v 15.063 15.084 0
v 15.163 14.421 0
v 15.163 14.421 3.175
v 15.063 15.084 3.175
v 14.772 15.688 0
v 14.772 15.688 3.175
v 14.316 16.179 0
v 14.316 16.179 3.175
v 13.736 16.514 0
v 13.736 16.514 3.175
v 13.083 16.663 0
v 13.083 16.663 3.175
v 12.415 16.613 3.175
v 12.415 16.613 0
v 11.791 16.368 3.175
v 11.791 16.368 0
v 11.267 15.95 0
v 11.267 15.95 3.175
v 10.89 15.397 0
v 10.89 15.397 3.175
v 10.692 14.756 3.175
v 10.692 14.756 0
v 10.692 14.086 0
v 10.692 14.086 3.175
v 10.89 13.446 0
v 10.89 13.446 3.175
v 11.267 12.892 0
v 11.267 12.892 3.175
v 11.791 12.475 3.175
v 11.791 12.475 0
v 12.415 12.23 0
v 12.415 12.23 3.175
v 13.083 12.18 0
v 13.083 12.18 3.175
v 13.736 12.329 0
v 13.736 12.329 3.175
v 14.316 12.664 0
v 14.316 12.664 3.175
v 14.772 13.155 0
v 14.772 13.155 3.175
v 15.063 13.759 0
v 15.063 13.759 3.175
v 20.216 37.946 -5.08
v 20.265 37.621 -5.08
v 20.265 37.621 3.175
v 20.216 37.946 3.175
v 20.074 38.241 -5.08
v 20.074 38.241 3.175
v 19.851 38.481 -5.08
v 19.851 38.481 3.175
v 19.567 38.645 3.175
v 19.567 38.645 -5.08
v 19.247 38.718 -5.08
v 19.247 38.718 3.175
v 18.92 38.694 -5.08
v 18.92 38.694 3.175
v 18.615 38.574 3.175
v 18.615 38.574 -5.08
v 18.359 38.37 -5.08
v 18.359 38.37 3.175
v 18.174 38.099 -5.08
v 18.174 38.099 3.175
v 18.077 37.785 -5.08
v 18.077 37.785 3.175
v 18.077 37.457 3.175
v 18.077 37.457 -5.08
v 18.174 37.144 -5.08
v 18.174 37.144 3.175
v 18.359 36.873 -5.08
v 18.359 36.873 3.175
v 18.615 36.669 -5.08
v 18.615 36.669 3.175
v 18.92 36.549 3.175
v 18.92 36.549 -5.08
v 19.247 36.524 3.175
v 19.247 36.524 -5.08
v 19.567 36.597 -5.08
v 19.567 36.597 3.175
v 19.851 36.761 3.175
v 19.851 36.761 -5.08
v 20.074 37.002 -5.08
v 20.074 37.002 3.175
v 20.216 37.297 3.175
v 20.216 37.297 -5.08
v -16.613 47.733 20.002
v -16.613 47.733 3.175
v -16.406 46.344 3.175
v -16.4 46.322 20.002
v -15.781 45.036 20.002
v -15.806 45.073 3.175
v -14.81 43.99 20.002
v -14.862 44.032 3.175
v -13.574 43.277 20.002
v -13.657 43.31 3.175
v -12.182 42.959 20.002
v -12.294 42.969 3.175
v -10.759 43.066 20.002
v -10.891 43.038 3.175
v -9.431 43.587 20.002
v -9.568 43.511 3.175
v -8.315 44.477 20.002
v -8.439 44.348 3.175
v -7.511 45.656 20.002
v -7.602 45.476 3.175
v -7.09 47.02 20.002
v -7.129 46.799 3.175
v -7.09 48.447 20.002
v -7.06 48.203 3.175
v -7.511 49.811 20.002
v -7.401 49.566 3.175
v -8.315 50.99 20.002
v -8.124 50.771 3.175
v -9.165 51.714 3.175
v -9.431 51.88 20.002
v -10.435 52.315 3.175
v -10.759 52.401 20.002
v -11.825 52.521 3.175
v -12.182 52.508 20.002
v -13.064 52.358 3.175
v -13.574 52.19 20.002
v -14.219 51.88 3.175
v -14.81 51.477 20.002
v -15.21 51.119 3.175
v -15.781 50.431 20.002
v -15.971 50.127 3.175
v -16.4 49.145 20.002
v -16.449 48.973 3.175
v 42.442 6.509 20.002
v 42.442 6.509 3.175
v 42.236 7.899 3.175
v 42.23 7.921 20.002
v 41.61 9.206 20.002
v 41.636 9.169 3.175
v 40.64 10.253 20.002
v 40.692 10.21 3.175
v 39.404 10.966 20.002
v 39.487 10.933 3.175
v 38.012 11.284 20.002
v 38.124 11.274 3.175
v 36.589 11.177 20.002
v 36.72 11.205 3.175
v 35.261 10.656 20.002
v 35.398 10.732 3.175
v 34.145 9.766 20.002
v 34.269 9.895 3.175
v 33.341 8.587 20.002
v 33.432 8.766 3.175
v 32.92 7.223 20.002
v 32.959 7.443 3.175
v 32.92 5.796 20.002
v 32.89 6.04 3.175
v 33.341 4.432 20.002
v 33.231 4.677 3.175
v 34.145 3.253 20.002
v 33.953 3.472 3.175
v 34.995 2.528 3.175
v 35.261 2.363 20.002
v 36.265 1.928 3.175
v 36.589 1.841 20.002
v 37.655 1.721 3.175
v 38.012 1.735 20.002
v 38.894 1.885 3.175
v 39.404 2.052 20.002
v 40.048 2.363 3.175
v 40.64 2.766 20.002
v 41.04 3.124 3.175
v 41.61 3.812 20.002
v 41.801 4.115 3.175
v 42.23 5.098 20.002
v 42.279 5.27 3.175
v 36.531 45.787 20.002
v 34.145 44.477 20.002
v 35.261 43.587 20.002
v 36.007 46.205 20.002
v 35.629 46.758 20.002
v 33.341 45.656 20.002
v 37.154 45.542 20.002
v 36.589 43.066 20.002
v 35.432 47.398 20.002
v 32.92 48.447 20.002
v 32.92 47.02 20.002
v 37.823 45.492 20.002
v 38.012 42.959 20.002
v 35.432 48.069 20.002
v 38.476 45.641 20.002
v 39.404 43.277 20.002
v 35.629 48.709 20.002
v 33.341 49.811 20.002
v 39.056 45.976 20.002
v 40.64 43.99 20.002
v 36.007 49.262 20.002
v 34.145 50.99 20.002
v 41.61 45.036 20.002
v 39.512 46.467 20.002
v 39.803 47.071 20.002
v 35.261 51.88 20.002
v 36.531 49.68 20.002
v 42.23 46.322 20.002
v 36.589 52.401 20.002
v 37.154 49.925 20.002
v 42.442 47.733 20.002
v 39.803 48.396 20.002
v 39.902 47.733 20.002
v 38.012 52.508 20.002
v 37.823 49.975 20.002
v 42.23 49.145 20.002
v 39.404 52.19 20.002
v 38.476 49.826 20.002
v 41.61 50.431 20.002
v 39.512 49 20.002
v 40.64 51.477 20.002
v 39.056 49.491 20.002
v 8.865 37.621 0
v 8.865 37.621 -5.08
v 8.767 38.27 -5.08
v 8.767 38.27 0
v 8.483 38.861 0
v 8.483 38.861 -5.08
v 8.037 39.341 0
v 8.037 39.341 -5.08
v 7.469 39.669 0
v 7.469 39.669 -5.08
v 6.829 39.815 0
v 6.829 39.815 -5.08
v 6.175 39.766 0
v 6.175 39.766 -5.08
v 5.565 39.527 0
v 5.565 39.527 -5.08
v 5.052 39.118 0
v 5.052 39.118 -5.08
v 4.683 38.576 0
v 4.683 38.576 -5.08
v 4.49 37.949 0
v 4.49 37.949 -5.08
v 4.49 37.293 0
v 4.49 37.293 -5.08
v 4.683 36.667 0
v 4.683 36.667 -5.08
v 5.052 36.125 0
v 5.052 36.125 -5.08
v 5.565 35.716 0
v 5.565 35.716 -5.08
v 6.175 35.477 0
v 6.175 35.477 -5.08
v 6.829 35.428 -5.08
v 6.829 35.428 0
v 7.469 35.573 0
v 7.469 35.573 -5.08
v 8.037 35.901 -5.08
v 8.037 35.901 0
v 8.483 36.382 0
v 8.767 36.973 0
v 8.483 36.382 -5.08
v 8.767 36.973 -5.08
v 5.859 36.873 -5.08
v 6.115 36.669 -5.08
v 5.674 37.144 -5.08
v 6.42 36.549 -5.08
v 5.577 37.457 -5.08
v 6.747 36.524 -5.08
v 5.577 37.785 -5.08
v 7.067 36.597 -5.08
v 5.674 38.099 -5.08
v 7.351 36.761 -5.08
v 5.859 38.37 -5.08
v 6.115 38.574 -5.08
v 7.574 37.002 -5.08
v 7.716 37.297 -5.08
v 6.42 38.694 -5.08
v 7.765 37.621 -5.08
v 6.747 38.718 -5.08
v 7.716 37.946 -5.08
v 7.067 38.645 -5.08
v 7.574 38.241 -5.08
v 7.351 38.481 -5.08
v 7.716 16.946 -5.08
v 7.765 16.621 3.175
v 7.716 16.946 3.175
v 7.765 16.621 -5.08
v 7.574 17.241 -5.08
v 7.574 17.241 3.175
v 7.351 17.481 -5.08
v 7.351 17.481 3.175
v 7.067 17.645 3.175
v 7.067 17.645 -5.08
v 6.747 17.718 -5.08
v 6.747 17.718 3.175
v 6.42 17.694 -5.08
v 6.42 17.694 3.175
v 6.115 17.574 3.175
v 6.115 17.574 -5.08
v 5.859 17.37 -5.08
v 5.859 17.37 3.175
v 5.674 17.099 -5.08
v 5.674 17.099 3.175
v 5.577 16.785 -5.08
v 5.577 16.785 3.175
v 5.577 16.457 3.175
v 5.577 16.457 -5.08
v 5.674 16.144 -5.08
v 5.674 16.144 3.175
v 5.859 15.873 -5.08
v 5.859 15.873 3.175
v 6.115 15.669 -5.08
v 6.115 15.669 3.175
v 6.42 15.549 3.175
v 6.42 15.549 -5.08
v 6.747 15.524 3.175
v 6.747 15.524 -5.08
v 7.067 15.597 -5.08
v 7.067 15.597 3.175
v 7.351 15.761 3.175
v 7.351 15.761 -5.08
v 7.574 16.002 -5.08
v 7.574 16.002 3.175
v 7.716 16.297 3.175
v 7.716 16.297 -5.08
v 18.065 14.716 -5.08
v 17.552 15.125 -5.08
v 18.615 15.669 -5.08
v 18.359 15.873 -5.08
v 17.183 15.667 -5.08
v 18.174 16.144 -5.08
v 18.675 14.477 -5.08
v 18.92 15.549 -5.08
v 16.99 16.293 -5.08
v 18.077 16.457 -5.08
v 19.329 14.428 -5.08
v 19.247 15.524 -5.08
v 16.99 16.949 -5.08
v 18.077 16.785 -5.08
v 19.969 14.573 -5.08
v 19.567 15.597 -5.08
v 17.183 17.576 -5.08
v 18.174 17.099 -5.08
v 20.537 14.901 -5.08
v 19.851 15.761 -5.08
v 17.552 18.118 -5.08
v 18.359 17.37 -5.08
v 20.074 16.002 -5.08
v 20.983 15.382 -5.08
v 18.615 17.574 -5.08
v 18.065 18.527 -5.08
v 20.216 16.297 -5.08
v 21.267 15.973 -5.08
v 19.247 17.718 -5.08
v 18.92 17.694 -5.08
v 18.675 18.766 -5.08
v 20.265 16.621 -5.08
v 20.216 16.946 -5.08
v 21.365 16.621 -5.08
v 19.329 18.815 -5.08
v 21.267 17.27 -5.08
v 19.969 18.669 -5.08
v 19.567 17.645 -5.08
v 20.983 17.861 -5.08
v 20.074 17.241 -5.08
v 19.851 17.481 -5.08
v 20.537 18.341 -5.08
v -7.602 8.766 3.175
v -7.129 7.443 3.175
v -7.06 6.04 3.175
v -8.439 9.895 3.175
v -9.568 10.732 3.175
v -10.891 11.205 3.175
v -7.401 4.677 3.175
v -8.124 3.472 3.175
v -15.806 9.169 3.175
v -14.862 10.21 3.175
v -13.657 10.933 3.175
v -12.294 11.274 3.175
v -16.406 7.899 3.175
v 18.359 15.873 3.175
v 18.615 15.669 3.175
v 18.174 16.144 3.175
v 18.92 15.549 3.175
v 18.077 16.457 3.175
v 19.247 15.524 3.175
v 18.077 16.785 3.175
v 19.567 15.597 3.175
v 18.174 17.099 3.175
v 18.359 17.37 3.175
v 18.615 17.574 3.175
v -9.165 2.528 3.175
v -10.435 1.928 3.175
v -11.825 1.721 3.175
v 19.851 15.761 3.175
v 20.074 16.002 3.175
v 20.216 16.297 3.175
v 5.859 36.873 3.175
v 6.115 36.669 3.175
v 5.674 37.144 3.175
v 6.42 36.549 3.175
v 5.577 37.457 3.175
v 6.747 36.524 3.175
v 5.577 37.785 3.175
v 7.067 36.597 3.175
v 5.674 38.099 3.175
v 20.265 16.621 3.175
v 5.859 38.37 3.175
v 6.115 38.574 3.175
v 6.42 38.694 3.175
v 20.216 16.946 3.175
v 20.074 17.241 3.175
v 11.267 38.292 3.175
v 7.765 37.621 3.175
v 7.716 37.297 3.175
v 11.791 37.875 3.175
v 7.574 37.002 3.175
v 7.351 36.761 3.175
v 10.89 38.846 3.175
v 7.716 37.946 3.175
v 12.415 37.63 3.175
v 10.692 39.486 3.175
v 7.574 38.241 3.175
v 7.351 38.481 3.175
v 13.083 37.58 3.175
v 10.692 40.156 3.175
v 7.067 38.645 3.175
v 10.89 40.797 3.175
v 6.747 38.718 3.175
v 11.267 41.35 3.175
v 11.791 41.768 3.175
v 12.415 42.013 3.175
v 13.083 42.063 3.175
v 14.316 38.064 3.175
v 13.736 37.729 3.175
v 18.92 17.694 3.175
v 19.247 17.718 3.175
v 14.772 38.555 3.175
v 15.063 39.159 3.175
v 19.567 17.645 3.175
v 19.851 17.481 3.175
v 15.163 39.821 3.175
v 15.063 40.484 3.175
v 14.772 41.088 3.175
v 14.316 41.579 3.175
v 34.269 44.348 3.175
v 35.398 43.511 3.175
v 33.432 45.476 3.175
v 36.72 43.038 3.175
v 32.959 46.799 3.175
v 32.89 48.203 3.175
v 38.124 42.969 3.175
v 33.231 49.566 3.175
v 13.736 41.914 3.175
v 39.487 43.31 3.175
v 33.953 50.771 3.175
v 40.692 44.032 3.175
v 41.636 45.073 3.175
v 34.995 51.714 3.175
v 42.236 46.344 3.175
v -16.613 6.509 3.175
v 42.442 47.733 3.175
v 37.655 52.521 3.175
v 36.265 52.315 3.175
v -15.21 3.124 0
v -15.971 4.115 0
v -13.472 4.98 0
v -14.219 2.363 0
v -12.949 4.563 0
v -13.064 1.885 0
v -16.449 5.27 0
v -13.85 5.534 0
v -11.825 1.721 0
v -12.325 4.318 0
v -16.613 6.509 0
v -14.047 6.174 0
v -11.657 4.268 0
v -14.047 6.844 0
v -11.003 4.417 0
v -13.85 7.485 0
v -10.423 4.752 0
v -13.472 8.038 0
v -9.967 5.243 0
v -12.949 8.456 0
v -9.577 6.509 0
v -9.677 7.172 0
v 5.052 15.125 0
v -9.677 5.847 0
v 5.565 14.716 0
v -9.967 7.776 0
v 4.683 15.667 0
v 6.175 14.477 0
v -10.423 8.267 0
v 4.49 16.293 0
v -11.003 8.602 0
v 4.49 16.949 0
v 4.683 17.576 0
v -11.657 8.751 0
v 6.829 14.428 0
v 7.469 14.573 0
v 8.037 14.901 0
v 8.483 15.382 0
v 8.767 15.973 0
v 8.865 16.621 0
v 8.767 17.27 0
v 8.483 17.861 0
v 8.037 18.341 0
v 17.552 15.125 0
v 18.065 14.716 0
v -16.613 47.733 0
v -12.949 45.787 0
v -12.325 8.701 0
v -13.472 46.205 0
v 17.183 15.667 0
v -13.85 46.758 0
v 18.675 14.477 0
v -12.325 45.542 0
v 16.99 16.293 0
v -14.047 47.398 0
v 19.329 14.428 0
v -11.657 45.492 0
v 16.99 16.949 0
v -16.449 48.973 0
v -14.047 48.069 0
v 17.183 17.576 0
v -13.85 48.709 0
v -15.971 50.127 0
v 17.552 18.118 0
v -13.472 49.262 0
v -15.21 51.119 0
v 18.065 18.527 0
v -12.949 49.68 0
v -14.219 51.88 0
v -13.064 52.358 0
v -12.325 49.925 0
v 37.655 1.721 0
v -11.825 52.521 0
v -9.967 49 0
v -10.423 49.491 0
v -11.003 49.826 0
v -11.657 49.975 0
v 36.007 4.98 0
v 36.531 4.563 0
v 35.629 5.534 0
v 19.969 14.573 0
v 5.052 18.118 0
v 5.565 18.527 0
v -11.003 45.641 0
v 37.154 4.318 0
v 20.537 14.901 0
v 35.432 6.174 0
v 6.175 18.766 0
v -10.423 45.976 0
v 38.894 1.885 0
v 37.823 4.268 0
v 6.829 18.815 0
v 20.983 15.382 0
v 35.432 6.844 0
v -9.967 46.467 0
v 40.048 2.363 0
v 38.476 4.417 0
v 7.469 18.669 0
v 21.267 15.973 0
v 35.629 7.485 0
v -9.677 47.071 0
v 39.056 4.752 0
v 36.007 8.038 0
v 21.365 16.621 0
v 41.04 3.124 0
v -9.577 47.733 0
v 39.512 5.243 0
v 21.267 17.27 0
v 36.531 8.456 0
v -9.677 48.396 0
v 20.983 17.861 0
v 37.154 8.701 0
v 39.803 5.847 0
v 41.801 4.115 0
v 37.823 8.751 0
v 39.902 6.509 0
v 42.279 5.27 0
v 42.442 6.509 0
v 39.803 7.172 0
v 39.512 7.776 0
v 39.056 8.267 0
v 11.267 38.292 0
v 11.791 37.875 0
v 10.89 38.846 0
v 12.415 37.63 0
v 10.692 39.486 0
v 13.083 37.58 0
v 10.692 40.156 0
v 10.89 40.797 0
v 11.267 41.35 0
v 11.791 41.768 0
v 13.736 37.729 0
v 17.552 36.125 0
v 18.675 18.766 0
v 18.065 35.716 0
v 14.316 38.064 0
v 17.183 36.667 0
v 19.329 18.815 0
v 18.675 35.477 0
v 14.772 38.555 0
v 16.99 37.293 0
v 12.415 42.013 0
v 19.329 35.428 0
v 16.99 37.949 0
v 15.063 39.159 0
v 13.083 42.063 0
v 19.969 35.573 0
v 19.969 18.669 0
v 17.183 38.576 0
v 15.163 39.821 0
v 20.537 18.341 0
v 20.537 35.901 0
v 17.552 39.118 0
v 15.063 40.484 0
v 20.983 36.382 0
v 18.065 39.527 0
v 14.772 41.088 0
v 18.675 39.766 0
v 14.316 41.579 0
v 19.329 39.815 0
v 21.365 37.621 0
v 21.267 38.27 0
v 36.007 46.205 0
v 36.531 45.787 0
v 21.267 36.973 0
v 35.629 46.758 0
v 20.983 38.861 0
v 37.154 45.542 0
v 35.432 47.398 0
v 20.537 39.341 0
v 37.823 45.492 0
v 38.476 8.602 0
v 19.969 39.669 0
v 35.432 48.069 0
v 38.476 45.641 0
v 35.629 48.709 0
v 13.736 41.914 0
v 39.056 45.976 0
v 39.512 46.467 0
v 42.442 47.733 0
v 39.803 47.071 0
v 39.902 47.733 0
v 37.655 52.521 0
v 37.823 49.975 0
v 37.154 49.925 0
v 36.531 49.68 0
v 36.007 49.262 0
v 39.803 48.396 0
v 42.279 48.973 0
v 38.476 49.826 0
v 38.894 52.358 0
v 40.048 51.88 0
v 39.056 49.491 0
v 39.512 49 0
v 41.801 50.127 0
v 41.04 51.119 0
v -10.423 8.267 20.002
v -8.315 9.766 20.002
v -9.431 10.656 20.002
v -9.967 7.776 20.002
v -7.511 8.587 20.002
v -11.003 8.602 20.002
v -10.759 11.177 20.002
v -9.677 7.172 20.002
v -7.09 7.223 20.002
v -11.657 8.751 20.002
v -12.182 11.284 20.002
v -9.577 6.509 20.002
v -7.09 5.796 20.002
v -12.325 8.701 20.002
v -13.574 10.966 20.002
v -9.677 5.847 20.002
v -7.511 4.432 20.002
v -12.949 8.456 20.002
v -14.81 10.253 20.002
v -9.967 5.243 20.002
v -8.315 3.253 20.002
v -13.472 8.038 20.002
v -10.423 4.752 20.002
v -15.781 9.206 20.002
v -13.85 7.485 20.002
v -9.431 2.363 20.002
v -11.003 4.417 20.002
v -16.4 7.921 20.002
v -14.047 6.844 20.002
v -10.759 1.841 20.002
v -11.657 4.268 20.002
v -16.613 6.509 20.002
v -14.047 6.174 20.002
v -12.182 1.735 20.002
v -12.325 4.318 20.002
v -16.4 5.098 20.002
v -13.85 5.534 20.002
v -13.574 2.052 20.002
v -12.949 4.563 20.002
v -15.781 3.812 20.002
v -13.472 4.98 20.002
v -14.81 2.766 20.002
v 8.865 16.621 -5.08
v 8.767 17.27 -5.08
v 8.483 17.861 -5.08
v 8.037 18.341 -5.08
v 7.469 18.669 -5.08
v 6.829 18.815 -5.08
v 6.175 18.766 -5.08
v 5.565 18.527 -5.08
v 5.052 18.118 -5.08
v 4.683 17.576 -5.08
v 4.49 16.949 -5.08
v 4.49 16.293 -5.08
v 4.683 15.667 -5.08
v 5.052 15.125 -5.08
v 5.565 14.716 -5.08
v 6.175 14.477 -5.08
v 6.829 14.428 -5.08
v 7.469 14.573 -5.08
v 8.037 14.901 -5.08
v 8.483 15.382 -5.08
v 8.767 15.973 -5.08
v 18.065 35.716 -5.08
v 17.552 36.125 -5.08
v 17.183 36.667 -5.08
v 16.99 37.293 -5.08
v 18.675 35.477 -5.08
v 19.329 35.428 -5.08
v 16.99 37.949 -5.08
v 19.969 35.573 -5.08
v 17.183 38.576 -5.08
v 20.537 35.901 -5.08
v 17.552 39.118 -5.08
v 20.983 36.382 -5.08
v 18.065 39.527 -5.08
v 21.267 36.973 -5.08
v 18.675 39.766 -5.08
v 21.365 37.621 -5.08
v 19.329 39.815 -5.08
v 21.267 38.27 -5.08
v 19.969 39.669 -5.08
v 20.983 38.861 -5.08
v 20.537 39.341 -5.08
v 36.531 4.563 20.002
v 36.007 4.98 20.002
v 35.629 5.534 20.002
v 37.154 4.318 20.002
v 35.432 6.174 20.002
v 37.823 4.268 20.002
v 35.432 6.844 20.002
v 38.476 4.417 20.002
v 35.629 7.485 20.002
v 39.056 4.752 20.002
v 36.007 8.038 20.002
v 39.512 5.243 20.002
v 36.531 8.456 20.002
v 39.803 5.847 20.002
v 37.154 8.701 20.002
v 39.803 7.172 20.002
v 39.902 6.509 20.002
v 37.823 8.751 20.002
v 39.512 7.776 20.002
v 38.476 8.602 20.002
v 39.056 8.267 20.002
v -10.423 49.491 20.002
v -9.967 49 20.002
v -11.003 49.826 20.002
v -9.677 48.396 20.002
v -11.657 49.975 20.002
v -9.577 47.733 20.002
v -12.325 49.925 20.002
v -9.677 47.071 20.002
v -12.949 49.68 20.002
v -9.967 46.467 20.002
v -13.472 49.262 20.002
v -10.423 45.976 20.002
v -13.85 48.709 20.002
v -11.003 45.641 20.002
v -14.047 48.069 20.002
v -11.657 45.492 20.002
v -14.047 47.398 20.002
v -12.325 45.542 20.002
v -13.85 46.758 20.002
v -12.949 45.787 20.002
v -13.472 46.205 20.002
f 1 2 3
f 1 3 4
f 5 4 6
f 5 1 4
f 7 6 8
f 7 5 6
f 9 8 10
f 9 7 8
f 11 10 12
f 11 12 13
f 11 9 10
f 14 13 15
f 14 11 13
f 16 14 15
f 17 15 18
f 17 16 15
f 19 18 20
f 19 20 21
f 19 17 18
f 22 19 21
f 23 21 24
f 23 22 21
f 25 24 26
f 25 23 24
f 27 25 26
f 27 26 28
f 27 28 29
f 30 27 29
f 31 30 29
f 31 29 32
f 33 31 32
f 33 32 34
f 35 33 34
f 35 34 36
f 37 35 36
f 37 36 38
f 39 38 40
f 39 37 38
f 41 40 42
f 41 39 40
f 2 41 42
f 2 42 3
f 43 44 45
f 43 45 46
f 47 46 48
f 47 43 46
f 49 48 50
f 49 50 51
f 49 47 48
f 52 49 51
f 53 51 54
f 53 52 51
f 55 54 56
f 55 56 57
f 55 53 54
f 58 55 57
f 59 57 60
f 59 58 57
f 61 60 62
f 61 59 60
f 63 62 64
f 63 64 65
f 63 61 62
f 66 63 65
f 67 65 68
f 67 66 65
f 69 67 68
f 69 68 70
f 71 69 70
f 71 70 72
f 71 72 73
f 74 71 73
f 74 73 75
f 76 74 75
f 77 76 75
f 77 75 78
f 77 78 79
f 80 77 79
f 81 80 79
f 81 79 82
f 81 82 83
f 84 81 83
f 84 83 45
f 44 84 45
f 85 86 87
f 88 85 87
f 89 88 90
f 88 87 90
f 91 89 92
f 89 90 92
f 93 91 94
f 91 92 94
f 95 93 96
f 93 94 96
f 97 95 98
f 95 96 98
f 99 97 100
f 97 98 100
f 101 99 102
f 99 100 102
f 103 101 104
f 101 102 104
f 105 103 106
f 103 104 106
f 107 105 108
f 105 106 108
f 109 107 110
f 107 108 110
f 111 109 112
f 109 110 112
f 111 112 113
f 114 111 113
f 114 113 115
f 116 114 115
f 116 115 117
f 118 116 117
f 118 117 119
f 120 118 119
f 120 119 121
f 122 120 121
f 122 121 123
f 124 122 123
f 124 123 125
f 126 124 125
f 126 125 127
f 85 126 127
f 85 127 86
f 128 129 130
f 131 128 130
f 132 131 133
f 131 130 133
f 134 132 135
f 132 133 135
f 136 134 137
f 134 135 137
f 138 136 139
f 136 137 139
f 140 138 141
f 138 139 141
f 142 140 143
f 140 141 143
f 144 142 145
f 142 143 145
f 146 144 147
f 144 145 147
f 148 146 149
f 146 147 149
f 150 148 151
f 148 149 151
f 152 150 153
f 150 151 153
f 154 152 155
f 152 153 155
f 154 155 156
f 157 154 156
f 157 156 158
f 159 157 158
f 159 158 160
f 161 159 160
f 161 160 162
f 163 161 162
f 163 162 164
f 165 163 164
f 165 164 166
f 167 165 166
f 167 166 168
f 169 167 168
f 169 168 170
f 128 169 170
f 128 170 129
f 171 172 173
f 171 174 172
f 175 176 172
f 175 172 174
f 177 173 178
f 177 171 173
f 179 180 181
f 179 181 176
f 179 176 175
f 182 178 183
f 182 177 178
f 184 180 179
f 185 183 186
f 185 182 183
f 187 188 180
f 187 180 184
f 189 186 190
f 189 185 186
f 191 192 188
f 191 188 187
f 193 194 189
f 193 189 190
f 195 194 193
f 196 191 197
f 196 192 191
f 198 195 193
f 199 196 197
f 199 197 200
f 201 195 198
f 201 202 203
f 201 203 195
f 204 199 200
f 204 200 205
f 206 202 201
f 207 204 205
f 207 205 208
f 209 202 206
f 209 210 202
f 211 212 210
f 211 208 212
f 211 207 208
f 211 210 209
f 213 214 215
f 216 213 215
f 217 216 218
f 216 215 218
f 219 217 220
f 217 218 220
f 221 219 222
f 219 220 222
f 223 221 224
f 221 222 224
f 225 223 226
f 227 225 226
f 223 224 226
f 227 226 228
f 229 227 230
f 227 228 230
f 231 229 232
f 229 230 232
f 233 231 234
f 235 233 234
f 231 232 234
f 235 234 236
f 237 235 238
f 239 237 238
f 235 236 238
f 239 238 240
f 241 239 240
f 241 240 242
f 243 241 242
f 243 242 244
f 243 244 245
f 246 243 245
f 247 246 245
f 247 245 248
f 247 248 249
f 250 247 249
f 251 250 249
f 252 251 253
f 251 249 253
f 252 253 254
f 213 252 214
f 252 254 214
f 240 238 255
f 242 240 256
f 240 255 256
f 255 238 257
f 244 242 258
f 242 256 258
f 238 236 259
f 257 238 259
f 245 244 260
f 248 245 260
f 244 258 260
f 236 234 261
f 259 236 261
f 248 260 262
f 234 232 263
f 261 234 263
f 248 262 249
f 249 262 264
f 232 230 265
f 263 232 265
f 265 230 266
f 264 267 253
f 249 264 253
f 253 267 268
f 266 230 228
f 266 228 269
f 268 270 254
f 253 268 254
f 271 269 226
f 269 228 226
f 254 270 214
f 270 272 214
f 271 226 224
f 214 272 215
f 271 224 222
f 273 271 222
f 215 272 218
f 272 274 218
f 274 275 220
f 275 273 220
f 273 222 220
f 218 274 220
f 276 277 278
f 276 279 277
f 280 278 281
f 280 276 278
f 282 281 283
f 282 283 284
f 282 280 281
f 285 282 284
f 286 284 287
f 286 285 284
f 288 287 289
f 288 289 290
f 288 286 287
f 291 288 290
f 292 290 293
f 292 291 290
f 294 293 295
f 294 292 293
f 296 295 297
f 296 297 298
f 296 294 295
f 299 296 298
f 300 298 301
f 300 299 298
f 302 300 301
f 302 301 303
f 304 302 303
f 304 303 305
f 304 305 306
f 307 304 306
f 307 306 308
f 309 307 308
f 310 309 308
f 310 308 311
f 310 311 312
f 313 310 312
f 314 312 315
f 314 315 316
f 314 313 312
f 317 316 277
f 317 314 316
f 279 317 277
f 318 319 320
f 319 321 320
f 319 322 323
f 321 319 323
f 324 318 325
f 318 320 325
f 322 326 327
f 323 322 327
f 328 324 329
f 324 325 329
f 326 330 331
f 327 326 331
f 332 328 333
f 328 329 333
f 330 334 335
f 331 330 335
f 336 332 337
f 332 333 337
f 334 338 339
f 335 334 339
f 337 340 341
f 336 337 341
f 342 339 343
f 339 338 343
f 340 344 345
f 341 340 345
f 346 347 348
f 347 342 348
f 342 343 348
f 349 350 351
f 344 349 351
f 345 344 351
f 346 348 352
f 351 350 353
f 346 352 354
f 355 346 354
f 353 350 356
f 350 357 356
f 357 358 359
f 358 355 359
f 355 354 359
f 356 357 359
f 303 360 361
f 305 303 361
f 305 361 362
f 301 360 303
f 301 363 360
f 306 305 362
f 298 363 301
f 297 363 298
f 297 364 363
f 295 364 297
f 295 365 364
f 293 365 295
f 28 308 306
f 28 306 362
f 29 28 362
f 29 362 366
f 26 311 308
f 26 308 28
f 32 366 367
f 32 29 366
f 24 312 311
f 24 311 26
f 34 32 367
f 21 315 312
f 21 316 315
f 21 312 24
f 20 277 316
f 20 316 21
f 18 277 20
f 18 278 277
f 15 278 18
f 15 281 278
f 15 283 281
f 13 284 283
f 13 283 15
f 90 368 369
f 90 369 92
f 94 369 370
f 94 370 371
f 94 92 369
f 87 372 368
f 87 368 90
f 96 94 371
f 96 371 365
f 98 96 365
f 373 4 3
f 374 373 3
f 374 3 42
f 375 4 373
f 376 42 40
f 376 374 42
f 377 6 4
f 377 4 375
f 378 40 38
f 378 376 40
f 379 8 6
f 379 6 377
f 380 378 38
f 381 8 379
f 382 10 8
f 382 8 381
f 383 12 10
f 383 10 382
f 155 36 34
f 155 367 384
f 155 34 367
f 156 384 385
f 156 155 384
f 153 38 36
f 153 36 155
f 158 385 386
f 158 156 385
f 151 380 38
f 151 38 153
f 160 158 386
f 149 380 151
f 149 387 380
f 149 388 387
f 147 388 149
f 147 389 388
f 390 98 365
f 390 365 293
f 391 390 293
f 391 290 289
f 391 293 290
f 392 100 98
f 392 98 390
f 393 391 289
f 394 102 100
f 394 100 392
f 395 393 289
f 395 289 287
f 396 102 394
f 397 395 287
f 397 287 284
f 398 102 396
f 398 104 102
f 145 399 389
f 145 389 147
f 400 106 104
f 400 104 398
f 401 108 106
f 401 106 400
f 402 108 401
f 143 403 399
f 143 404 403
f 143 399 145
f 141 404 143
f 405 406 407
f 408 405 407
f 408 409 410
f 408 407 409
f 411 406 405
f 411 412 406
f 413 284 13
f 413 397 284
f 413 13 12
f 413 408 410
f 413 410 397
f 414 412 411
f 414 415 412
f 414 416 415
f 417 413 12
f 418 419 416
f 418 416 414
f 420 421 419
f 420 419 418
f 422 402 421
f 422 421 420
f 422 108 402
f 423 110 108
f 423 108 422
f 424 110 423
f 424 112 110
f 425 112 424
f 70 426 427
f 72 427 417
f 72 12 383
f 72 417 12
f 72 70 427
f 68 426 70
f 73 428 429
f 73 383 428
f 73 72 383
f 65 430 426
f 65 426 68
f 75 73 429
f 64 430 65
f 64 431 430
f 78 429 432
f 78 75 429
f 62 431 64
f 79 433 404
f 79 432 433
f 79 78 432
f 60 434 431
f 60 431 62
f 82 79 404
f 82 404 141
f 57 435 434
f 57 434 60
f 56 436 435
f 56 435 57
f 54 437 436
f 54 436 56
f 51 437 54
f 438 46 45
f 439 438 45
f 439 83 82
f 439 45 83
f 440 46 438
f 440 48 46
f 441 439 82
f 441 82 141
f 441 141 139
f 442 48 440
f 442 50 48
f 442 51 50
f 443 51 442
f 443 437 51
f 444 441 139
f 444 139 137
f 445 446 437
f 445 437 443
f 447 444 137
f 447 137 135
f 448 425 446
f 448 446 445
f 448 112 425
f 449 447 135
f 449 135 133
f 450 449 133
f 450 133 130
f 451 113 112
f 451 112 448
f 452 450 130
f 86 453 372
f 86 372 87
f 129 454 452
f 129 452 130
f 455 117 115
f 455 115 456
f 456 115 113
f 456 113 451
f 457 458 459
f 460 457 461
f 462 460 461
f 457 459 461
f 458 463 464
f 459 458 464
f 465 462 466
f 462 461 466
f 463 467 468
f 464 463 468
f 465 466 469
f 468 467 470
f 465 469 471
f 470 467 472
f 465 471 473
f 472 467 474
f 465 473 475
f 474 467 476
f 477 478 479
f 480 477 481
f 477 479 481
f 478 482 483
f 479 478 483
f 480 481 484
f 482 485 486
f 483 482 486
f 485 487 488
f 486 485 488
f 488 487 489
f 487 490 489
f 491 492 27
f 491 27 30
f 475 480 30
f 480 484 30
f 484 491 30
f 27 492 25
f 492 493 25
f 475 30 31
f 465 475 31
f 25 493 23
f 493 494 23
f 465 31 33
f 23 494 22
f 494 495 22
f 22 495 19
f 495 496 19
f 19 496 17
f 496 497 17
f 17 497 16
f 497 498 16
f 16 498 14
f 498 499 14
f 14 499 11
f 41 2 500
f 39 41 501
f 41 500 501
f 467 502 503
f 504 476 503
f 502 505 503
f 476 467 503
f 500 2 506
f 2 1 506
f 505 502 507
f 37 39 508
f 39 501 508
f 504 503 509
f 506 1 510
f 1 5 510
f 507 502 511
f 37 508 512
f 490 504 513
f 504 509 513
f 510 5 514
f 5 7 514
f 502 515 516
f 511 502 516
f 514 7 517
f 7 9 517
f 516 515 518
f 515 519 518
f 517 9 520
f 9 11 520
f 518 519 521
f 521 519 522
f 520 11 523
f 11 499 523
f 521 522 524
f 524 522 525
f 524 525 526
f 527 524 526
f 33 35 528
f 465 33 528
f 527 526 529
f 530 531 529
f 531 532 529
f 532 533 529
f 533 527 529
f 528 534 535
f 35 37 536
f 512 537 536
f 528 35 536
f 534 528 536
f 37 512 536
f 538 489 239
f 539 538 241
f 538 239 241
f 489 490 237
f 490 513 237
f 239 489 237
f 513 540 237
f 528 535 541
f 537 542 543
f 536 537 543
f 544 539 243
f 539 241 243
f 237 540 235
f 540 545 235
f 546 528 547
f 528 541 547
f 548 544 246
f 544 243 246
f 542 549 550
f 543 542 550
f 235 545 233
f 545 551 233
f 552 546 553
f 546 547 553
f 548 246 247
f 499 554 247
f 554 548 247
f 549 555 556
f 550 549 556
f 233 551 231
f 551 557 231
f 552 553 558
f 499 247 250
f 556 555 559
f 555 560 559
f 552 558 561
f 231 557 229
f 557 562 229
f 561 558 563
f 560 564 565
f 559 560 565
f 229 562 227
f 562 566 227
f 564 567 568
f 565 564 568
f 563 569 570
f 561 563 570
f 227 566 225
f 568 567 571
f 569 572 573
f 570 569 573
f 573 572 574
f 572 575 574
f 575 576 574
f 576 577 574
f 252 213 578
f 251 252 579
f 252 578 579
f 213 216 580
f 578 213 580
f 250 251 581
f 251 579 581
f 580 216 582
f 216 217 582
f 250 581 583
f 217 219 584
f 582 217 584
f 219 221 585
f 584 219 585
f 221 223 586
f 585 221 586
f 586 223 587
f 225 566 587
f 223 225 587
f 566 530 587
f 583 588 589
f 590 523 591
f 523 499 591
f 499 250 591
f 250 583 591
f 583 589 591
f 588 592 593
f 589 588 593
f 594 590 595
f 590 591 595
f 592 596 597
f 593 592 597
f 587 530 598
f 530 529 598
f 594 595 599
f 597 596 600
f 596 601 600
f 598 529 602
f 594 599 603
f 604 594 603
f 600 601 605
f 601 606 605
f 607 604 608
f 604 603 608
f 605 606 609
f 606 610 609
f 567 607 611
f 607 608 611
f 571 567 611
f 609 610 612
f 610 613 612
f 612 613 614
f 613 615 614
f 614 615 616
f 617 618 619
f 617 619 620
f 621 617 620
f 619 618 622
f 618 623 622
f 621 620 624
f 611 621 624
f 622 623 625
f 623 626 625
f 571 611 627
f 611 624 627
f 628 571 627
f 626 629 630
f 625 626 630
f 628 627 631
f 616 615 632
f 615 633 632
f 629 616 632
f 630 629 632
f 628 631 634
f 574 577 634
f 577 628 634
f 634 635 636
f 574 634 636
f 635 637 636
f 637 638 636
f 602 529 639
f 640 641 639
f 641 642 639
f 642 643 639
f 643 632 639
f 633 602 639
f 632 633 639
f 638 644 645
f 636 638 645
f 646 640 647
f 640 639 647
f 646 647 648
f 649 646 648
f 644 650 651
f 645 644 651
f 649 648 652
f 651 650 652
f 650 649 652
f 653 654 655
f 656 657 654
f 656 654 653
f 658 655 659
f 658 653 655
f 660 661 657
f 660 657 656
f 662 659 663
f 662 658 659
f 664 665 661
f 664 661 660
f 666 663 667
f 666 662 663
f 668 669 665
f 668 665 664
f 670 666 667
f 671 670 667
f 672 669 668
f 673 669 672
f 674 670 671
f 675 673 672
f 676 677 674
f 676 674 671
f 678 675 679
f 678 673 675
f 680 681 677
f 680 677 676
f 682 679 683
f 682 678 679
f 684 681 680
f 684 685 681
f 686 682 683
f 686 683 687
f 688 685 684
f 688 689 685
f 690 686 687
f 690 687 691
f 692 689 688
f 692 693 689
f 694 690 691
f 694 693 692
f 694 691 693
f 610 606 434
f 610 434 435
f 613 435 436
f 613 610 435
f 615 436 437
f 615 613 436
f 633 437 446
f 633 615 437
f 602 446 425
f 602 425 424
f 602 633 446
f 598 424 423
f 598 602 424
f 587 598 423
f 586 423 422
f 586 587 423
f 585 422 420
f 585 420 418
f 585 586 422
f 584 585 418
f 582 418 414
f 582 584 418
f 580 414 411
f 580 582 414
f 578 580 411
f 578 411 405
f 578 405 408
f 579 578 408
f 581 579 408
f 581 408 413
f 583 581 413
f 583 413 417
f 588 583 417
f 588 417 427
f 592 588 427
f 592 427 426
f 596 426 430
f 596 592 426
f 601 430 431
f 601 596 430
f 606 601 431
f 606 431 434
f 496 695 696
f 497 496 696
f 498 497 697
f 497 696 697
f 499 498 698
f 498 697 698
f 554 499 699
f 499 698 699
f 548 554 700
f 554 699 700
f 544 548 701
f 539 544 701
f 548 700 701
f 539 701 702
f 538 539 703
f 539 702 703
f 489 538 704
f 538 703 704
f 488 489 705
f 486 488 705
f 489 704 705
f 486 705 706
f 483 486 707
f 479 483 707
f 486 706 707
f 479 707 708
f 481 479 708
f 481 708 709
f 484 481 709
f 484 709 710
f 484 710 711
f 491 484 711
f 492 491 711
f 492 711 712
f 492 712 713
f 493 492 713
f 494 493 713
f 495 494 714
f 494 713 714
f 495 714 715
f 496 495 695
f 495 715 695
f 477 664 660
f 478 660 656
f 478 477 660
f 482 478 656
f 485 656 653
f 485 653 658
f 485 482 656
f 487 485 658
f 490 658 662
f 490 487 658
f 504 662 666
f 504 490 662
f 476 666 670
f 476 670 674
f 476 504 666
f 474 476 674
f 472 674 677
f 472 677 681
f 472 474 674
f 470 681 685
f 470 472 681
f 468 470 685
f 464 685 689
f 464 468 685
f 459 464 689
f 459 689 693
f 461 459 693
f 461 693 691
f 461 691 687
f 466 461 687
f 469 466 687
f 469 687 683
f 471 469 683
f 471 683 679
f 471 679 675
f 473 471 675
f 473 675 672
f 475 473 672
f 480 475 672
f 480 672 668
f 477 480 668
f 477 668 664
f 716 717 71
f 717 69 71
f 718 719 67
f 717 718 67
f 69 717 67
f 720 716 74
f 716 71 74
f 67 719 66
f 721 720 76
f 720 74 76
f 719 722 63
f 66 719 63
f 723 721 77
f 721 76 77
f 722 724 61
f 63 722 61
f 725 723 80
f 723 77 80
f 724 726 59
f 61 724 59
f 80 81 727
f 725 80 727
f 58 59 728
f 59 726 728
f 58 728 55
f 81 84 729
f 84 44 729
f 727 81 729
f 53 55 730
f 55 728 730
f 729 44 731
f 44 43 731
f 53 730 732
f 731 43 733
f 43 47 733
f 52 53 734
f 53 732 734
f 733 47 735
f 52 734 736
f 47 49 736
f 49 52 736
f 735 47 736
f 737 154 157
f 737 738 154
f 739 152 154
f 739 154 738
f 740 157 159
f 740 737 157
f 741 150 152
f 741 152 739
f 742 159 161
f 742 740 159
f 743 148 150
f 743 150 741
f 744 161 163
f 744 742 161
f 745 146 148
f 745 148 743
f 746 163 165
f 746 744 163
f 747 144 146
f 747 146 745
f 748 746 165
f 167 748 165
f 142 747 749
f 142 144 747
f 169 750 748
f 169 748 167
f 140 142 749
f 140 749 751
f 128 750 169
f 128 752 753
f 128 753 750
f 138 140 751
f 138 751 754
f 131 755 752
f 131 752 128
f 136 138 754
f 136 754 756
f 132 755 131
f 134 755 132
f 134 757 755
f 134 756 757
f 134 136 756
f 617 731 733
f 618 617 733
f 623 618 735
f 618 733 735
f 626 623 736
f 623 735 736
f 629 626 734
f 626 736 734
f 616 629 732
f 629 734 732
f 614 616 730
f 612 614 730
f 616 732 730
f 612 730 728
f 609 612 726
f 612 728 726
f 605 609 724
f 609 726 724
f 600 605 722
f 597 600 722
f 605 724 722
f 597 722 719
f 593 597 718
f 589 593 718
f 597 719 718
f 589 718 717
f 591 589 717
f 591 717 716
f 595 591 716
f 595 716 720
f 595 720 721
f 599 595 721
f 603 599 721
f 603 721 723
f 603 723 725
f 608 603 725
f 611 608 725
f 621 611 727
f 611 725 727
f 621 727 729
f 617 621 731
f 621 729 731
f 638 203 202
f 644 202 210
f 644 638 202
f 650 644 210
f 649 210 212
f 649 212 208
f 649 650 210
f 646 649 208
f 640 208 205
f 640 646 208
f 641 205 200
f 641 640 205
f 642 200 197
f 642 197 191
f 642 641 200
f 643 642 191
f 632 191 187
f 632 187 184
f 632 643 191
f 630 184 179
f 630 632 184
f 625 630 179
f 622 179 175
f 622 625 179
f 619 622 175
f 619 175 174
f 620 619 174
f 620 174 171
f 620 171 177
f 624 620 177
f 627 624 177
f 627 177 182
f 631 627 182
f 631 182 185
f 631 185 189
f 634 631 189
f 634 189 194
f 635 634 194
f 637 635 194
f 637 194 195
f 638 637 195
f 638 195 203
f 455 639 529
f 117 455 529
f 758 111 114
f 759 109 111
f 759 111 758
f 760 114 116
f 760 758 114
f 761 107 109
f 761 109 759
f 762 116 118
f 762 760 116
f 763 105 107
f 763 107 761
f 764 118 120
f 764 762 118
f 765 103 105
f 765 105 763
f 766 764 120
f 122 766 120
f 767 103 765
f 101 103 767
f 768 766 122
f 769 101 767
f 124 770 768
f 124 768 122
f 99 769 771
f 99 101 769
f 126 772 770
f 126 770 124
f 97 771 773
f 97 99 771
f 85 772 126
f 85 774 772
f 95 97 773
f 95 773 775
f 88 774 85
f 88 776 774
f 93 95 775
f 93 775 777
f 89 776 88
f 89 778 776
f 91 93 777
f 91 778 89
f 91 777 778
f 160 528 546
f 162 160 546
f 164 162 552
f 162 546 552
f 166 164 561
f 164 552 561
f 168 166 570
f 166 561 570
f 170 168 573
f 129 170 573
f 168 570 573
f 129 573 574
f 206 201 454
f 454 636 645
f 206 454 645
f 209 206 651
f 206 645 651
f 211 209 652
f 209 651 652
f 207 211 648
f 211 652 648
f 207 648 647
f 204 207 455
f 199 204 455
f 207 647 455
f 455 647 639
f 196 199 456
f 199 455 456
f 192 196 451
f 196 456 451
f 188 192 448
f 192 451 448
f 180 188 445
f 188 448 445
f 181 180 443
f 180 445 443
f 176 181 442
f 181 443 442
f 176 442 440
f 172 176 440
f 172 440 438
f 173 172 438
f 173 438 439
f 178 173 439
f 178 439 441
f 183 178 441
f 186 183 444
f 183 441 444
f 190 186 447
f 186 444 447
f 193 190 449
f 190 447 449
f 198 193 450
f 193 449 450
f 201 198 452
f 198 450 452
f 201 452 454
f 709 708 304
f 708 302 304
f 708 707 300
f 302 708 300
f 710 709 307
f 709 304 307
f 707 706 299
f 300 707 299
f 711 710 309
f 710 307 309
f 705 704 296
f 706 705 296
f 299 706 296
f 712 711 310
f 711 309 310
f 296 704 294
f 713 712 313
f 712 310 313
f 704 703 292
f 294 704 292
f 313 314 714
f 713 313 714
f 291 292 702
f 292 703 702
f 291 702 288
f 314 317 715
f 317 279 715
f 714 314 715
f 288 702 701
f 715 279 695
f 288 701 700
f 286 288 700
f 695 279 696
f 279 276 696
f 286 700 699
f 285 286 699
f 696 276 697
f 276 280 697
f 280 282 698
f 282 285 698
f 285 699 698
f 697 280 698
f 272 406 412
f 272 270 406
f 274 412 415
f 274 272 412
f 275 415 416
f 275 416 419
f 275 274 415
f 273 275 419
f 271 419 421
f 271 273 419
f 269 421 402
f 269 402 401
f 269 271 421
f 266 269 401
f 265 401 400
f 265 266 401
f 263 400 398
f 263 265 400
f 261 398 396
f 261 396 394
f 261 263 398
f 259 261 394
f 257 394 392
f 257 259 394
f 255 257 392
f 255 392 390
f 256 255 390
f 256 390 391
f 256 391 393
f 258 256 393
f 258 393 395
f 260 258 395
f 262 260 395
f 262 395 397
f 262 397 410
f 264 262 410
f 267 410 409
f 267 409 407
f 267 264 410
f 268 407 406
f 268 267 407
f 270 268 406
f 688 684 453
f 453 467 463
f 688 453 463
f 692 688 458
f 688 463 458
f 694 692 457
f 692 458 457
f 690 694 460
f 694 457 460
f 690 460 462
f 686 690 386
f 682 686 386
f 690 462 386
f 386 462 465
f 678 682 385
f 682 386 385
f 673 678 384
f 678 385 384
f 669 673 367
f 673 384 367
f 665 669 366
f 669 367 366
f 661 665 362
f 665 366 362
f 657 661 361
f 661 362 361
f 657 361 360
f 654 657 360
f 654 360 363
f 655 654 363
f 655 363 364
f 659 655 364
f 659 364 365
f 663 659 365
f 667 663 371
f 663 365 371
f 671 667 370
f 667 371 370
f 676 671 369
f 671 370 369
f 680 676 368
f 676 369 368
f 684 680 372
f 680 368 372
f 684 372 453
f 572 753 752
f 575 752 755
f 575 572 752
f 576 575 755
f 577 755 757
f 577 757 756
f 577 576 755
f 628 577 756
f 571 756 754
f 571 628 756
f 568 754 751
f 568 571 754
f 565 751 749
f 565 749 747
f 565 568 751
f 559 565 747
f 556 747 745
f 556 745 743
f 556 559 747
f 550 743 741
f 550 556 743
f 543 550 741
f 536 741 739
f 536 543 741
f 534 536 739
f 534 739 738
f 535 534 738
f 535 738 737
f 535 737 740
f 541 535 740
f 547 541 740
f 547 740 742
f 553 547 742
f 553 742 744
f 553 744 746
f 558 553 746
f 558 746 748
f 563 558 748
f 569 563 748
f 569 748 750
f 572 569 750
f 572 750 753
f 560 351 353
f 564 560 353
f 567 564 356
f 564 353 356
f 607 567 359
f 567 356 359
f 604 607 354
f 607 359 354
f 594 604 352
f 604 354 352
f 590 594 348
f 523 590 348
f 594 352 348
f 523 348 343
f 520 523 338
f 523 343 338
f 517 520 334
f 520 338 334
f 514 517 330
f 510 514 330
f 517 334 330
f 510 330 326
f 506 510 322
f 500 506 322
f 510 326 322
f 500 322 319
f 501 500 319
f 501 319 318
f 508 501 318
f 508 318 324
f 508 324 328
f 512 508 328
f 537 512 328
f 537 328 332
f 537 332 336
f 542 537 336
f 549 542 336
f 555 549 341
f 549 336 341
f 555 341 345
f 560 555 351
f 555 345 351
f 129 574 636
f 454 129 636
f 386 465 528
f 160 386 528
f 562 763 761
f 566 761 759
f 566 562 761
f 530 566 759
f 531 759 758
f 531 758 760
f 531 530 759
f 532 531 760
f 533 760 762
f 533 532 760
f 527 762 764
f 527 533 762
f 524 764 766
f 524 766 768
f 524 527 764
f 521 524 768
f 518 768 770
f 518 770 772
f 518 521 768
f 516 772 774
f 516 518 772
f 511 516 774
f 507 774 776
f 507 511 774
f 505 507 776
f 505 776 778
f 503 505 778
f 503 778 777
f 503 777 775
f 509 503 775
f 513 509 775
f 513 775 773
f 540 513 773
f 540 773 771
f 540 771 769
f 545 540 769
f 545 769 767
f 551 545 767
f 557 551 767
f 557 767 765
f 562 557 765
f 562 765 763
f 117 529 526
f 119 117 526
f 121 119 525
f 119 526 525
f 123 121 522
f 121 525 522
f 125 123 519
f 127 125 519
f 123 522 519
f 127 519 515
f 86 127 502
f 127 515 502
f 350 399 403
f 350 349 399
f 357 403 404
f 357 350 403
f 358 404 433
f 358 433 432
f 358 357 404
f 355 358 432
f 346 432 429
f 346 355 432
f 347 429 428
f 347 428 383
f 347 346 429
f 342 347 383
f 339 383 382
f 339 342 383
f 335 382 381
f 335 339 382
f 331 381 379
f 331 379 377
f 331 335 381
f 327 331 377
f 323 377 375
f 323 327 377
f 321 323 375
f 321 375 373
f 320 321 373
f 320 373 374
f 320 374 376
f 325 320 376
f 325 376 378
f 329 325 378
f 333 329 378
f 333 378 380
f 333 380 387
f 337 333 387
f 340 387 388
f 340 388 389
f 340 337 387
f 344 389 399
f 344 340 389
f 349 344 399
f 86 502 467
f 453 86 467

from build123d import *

# Parameters (mm, degrees)
SKETCH1_R           = 2.2479
SKETCH1_R_2         = 1.1
BOSS_EXTRUDE1_DEPTH = 3.175
BOSS_EXTRUDE2_START = -5.08
SKETCH1_4_R         = 2.2
SKETCH1_4_R_2       = 1.1
BOSS_EXTRUDE2_DEPTH = 5.08
SKETCH1_5_R         = 4.7879
SKETCH1_5_R_2       = 2.2479
BOSS_EXTRUDE3_DEPTH = 20.0025


with BuildPart() as part:
    # Sketch1 → Boss-Extrude1 (new body)
    with BuildSketch(Plane.XY):
        with BuildLine():
            Line((-16.612553398, 47.733487864), (-16.612553398, 6.509287864))
            ThreePointArc((-16.612553398, 6.509287864), (-15.210209956, 3.123731306), (-11.824653398, 1.721387864))
            Line((-11.824653398, 1.721387864), (37.654546627, 1.721387864))
            ThreePointArc((37.654546627, 1.721387864), (41.040103169, 3.123731315), (42.442446602, 6.509287864))
            Line((42.442446602, 6.509287864), (42.442446602, 47.733487864))
            ThreePointArc((42.442446602, 47.733487864), (41.04010316, 51.119044422), (37.654546602, 52.521387864))
            Line((37.654546602, 52.521387864), (-11.824653398, 52.521387864))
            ThreePointArc((-11.824653398, 52.521387864), (-15.210209956, 51.119044422), (-16.612553398, 47.733487864))
        make_face()
        with Locations((12.914946602, 14.421387864)):
            Circle(SKETCH1_R, mode=Mode.SUBTRACT)
        with Locations((12.914946602, 39.821387864)):
            Circle(SKETCH1_R, mode=Mode.SUBTRACT)
        with Locations((-11.824653398, 6.509287864)):
            Circle(SKETCH1_R, mode=Mode.SUBTRACT)
        with Locations((-11.824653398, 47.733487864)):
            Circle(SKETCH1_R, mode=Mode.SUBTRACT)
        with Locations((37.654546602, 47.733487864)):
            Circle(SKETCH1_R, mode=Mode.SUBTRACT)
        with Locations((37.654546602, 6.509287864)):
            Circle(SKETCH1_R, mode=Mode.SUBTRACT)
        with Locations((6.664946602, 16.621387864)):
            Circle(SKETCH1_R_2, mode=Mode.SUBTRACT)
        with Locations((19.164946602, 16.621387864)):
            Circle(SKETCH1_R_2, mode=Mode.SUBTRACT)
        with Locations((6.664946602, 37.621387864)):
            Circle(SKETCH1_R_2, mode=Mode.SUBTRACT)
        with Locations((19.164946602, 37.621387864)):
            Circle(SKETCH1_R_2, mode=Mode.SUBTRACT)
    extrude(amount=BOSS_EXTRUDE1_DEPTH)

    # Sketch1<4> → Boss-Extrude2 (add)
    # profile 1 of 4: a face of its own
    with BuildSketch(Plane.XY.offset(BOSS_EXTRUDE2_START)):
        with Locations((19.164946602, 16.621387864)):
            Circle(SKETCH1_4_R)
        with Locations((19.164946602, 16.621387864)):
            Circle(SKETCH1_4_R_2, mode=Mode.SUBTRACT)
    # profile 2 of 4: a face of its own
    with BuildSketch(Plane.XY.offset(BOSS_EXTRUDE2_START)):
        with Locations((6.664946602, 16.621387864)):
            Circle(SKETCH1_4_R)
        with Locations((6.664946602, 16.621387864)):
            Circle(SKETCH1_4_R_2, mode=Mode.SUBTRACT)
    # profile 3 of 4: a face of its own
    with BuildSketch(Plane.XY.offset(BOSS_EXTRUDE2_START)):
        with Locations((6.664946602, 37.621387864)):
            Circle(SKETCH1_4_R)
        with Locations((6.664946602, 37.621387864)):
            Circle(SKETCH1_4_R_2, mode=Mode.SUBTRACT)
    # profile 4 of 4: a face of its own
    with BuildSketch(Plane.XY.offset(BOSS_EXTRUDE2_START)):
        with Locations((19.164946602, 37.621387864)):
            Circle(SKETCH1_4_R)
        with Locations((19.164946602, 37.621387864)):
            Circle(SKETCH1_4_R_2, mode=Mode.SUBTRACT)
    extrude(amount=BOSS_EXTRUDE2_DEPTH)

    # Sketch1<5> → Boss-Extrude3 (add)
    # profile 1 of 4: a face of its own
    with BuildSketch(Plane.XY):
        with Locations((-11.824653398, 6.509287864)):
            Circle(SKETCH1_5_R)
        with Locations((-11.824653398, 6.509287864)):
            Circle(SKETCH1_5_R_2, mode=Mode.SUBTRACT)
    # profile 2 of 4: a face of its own
    with BuildSketch(Plane.XY):
        with Locations((37.654546602, 6.509287864)):
            Circle(SKETCH1_5_R)
        with Locations((37.654546602, 6.509287864)):
            Circle(SKETCH1_5_R_2, mode=Mode.SUBTRACT)
    # profile 3 of 4: a face of its own
    with BuildSketch(Plane.XY):
        with Locations((-11.824653398, 47.733487864)):
            Circle(SKETCH1_5_R)
        with Locations((-11.824653398, 47.733487864)):
            Circle(SKETCH1_5_R_2, mode=Mode.SUBTRACT)
    # profile 4 of 4: a face of its own
    with BuildSketch(Plane.XY):
        with Locations((37.654546602, 47.733487864)):
            Circle(SKETCH1_5_R)
        with Locations((37.654546602, 47.733487864)):
            Circle(SKETCH1_5_R_2, mode=Mode.SUBTRACT)
    extrude(amount=BOSS_EXTRUDE3_DEPTH)


solid = part.part
